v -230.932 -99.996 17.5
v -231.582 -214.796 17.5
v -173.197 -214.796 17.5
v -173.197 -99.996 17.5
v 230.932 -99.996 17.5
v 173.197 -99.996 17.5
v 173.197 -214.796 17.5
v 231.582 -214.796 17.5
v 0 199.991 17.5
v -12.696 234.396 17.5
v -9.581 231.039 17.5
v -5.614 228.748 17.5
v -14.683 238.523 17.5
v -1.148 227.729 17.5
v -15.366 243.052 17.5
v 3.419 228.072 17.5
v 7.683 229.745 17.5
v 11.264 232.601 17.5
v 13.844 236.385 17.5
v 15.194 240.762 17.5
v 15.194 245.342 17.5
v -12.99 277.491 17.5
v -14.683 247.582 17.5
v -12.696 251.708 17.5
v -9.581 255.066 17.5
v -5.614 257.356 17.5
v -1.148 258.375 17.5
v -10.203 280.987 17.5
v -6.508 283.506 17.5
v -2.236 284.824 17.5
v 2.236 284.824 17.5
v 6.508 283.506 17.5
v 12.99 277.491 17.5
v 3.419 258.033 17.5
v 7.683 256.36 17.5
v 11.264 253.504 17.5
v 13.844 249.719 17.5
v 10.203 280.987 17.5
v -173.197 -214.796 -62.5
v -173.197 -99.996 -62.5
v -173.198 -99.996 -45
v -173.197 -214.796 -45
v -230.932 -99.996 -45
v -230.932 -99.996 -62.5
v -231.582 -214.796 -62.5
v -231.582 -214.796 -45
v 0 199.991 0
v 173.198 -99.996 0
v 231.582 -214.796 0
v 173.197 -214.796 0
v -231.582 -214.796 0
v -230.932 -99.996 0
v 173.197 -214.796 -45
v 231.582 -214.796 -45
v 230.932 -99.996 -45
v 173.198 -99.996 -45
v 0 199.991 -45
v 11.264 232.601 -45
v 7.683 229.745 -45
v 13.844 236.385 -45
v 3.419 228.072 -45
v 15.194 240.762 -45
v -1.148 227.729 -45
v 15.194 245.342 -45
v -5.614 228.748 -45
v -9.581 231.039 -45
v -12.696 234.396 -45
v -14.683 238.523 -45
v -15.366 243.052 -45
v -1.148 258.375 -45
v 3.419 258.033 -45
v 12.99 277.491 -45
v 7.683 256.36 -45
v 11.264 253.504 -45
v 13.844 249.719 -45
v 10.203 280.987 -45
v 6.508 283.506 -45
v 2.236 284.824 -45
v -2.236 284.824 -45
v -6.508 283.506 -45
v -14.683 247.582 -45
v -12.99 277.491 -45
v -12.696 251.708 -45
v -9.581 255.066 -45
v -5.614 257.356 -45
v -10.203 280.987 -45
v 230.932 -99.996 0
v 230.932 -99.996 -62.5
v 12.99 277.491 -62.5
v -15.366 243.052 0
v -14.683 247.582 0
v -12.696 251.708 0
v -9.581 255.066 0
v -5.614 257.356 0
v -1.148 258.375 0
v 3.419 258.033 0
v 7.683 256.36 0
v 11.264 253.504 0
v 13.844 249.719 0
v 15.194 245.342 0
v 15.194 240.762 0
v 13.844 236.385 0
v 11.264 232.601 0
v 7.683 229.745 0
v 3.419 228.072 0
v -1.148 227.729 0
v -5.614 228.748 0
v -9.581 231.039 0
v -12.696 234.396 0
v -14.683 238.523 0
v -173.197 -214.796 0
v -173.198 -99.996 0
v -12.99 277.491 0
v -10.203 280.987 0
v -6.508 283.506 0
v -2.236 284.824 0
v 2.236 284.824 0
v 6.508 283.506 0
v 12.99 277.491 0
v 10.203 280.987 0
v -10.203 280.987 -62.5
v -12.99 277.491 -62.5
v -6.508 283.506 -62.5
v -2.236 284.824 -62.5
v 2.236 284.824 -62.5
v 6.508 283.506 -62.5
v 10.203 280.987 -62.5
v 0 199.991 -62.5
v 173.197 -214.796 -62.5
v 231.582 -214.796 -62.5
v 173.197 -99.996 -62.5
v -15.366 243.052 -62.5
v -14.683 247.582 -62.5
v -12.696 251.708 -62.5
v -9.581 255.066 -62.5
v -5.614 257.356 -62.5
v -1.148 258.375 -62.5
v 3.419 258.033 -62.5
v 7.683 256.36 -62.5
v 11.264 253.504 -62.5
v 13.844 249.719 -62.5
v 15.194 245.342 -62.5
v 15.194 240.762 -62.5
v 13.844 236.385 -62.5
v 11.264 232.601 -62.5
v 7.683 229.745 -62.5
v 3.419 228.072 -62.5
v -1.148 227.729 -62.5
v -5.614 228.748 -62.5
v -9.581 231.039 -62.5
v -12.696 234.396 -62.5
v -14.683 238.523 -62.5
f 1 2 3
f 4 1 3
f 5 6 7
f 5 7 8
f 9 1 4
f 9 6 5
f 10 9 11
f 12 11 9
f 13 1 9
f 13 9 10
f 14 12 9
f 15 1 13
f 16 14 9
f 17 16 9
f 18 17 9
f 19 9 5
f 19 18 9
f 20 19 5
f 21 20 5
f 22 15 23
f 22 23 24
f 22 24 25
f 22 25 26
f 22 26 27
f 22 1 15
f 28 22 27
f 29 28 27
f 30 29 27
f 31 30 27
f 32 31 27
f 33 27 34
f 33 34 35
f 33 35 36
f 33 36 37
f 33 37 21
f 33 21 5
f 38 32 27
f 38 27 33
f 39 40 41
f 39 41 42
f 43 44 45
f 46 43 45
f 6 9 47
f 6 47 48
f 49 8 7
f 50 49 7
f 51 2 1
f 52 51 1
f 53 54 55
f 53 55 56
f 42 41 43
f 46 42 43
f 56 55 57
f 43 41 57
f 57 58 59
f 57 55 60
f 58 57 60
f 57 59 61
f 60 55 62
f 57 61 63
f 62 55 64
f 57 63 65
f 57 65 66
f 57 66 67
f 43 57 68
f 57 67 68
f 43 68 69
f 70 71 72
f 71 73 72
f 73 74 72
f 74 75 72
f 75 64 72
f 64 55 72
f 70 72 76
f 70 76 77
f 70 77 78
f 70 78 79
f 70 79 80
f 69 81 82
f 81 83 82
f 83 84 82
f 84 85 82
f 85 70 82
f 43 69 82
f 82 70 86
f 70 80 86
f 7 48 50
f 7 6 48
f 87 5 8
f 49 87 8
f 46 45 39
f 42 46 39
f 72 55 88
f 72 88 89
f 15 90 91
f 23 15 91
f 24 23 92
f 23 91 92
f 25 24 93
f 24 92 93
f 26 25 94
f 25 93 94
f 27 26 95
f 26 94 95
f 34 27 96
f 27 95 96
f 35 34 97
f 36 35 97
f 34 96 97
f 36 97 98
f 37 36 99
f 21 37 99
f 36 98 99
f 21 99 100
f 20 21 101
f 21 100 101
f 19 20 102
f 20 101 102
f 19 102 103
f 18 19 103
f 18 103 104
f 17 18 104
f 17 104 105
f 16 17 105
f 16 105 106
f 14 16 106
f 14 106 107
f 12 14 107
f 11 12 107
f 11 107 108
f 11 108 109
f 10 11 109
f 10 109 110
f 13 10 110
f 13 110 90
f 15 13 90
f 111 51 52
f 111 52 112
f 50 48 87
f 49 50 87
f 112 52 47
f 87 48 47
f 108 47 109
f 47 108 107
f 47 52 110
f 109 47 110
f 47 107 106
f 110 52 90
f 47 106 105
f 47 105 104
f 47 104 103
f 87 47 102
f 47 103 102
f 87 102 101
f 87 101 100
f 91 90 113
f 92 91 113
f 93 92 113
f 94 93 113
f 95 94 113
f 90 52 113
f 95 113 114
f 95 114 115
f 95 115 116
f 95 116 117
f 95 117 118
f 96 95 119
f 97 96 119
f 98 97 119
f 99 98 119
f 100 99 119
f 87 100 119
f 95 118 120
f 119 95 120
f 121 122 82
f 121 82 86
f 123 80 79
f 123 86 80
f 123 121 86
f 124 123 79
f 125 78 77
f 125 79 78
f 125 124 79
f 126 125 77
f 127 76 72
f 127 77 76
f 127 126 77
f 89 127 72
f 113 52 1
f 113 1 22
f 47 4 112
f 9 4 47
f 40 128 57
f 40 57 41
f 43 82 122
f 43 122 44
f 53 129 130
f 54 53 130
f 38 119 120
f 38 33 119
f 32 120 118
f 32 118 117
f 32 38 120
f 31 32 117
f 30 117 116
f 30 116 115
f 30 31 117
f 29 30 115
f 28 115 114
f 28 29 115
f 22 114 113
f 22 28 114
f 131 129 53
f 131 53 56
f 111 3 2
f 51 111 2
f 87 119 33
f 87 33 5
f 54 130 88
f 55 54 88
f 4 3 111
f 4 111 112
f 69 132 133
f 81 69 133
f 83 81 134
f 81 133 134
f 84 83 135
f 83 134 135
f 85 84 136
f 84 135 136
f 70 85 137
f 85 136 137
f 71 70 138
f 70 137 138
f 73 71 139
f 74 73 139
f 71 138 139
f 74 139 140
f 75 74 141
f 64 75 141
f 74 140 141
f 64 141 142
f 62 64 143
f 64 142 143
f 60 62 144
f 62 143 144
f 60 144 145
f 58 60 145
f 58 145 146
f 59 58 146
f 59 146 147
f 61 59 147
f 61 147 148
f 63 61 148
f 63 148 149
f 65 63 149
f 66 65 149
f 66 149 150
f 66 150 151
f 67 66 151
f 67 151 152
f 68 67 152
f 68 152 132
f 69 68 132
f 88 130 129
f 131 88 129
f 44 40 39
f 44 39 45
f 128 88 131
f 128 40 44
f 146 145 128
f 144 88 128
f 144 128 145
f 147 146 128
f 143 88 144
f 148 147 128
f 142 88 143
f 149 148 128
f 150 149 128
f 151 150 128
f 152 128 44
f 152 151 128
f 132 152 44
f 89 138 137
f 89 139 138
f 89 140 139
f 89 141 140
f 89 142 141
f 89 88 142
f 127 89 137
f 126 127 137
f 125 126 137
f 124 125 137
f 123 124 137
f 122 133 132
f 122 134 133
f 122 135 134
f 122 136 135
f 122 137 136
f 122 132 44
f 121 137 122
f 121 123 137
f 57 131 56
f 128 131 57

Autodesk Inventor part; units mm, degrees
ref_plane "XZ Plane" through (0, 0, 0) normal (0, 1, 0) x (-1, 0, 0)
sketch "Sketch5" plane through (0, 0, 0) normal (0, 0, 1) x (1, 0, 0)
  line L0 (0, 299.9912) -> (259.8, -149.9956)
  line L1 (259.8, -149.9956) -> (-259.8, -149.9956)
  line L2 (-259.8, -149.9956) -> (0, 299.9912)
  point P0 (0, 0)
  point P1 (0, 0)
  dimension "d12" = 519.6
extrude "Extrusion5" add sketch "Sketch5" along normal blind 17.5
sketch "Sketch6" plane through (0, 0, 17.5) normal (0, 0, 1) x (1, 0, 0)
  point P0 (0, 0)
sketch "Sketch7" plane through (0, 0, 17.5) normal (0, 0, 1) x (1, 0, 0)
  point P0 (0, 0)
sketch "Sketch8" plane through (0, 0, 17.5) normal (0, 0, 1) x (1, 0, 0)
  line L0 (0, 199.9912) -> (173.1975, -99.9956)
  line L1 (173.1975, -99.9956) -> (-173.1975, -99.9956)
  line L2 (-173.1975, -99.9956) -> (0, 199.9912)
  line L3 (259.8, -149.9956) -> (0, 299.9912) projected
  point P0 (0, 0)
  point P1 (0, 0)
  dimension "d15" = 50
extrude "Extrusion6" cut sketch "Sketch8" against normal blind 323.25
sketch "Sketch9" plane through (0, 0, 17.5) normal (0, 0, 1) x (1, 0, 0)
  line L0 (-297.8185, -99.9956) -> (278.7912, -99.9956)
  line L1 (278.7912, -99.9956) -> (278.7912, -149.9956)
  line L2 (278.7912, -149.9956) -> (-297.8185, -149.9956)
  line L3 (-297.8185, -149.9956) -> (-297.8185, -99.9956)
  point P0 (0, 0)
extrude "Extrusion7" cut sketch "Sketch9" against normal blind 130.25
ref_plane "Work Plane2" through (0, 0, -22.5) normal (0, 0, -1) x (-1, 0, 0)
sketch "Sketch10" plane through (0, 0, -22.5) normal (0, 0, -1) x (-1, 0, 0)
  point P0 (0, 0)
mirror "Mirror3" about plane through (0, 0, -22.5) normal (0, 0, -1) of "Extrusion5", "Extrusion6", "Extrusion7"
fillet "Fillet3" radius 15 2 edges at (0, 299.9912, -53.75) (0, 299.9912, 8.75)
sketch "Sketch11" plane through (230.9325, -99.9956, -62.5) normal (0, 0, -1) x (-1, 0, 0)
  circle A0 centre (230.9325, 343.0479) radius 15.366
  point P0 (230.9325, 99.9956)
extrude "Extrusion8" cut sketch "Sketch11" against normal blind 474.75
sketch "Sketch12" plane through (230.9325, -99.9956, -62.5) normal (0, 0, -1) x (-1, 0, 0)
  line L0 (461.865, 0) -> (243.9229, 377.4868) projected
  line L1 (461.865, 0) -> (462.5144, -114.8)
  line L2 (404.1299, 0) -> (230.9325, 299.9868) projected
  line L3 (404.1299, 0) -> (404.1299, -114.8)
  line L4 (57.735, 0) -> (57.735, -112.3529)
  line L5 (57.735, 0) -> (0, 0) projected
  line L6 (0, 0) -> (0, -112.3529)
  line L7 (0, -112.3529) -> (57.735, -112.3529)
  line L8 (462.5144, -114.8) -> (404.1299, -114.8)
  line L9 (461.865, 0) -> (404.1299, 0)
  line L10 (0, 0) -> (57.735, 0) projected
  line L11 (57.735, 0) -> (0, 0)
  point P0 (230.9325, 99.9956)
  dimension "d24" = 114.8
extrude "Extrusion9" add sketch "Sketch12" against normal blind 17.5 contours L1 L8 L3 L9
sketch "Sketch13" plane through (230.9325, -99.9956, -62.5) normal (0, 0, -1) x (-1, 0, 0)
  point P0 (230.9325, 99.9956)
ref_plane "Work Plane3" through (0, 0, -22.5) normal (1, 0, 0) x (0, 1, 0)
mirror "Mirror4" about plane through (0, 0, -22.5) normal (1, 0, 0) of "Extrusion9"
mirror "Mirror5" about plane through (0, 0, -22.5) normal (0, 0, -1) of "Extrusion9", "Mirror4"
ref_plane "Work Plane4" through (0, 0, -22.5) normal (0, 0, -1) x (-1, 0, 0)
properties part number "tri"
